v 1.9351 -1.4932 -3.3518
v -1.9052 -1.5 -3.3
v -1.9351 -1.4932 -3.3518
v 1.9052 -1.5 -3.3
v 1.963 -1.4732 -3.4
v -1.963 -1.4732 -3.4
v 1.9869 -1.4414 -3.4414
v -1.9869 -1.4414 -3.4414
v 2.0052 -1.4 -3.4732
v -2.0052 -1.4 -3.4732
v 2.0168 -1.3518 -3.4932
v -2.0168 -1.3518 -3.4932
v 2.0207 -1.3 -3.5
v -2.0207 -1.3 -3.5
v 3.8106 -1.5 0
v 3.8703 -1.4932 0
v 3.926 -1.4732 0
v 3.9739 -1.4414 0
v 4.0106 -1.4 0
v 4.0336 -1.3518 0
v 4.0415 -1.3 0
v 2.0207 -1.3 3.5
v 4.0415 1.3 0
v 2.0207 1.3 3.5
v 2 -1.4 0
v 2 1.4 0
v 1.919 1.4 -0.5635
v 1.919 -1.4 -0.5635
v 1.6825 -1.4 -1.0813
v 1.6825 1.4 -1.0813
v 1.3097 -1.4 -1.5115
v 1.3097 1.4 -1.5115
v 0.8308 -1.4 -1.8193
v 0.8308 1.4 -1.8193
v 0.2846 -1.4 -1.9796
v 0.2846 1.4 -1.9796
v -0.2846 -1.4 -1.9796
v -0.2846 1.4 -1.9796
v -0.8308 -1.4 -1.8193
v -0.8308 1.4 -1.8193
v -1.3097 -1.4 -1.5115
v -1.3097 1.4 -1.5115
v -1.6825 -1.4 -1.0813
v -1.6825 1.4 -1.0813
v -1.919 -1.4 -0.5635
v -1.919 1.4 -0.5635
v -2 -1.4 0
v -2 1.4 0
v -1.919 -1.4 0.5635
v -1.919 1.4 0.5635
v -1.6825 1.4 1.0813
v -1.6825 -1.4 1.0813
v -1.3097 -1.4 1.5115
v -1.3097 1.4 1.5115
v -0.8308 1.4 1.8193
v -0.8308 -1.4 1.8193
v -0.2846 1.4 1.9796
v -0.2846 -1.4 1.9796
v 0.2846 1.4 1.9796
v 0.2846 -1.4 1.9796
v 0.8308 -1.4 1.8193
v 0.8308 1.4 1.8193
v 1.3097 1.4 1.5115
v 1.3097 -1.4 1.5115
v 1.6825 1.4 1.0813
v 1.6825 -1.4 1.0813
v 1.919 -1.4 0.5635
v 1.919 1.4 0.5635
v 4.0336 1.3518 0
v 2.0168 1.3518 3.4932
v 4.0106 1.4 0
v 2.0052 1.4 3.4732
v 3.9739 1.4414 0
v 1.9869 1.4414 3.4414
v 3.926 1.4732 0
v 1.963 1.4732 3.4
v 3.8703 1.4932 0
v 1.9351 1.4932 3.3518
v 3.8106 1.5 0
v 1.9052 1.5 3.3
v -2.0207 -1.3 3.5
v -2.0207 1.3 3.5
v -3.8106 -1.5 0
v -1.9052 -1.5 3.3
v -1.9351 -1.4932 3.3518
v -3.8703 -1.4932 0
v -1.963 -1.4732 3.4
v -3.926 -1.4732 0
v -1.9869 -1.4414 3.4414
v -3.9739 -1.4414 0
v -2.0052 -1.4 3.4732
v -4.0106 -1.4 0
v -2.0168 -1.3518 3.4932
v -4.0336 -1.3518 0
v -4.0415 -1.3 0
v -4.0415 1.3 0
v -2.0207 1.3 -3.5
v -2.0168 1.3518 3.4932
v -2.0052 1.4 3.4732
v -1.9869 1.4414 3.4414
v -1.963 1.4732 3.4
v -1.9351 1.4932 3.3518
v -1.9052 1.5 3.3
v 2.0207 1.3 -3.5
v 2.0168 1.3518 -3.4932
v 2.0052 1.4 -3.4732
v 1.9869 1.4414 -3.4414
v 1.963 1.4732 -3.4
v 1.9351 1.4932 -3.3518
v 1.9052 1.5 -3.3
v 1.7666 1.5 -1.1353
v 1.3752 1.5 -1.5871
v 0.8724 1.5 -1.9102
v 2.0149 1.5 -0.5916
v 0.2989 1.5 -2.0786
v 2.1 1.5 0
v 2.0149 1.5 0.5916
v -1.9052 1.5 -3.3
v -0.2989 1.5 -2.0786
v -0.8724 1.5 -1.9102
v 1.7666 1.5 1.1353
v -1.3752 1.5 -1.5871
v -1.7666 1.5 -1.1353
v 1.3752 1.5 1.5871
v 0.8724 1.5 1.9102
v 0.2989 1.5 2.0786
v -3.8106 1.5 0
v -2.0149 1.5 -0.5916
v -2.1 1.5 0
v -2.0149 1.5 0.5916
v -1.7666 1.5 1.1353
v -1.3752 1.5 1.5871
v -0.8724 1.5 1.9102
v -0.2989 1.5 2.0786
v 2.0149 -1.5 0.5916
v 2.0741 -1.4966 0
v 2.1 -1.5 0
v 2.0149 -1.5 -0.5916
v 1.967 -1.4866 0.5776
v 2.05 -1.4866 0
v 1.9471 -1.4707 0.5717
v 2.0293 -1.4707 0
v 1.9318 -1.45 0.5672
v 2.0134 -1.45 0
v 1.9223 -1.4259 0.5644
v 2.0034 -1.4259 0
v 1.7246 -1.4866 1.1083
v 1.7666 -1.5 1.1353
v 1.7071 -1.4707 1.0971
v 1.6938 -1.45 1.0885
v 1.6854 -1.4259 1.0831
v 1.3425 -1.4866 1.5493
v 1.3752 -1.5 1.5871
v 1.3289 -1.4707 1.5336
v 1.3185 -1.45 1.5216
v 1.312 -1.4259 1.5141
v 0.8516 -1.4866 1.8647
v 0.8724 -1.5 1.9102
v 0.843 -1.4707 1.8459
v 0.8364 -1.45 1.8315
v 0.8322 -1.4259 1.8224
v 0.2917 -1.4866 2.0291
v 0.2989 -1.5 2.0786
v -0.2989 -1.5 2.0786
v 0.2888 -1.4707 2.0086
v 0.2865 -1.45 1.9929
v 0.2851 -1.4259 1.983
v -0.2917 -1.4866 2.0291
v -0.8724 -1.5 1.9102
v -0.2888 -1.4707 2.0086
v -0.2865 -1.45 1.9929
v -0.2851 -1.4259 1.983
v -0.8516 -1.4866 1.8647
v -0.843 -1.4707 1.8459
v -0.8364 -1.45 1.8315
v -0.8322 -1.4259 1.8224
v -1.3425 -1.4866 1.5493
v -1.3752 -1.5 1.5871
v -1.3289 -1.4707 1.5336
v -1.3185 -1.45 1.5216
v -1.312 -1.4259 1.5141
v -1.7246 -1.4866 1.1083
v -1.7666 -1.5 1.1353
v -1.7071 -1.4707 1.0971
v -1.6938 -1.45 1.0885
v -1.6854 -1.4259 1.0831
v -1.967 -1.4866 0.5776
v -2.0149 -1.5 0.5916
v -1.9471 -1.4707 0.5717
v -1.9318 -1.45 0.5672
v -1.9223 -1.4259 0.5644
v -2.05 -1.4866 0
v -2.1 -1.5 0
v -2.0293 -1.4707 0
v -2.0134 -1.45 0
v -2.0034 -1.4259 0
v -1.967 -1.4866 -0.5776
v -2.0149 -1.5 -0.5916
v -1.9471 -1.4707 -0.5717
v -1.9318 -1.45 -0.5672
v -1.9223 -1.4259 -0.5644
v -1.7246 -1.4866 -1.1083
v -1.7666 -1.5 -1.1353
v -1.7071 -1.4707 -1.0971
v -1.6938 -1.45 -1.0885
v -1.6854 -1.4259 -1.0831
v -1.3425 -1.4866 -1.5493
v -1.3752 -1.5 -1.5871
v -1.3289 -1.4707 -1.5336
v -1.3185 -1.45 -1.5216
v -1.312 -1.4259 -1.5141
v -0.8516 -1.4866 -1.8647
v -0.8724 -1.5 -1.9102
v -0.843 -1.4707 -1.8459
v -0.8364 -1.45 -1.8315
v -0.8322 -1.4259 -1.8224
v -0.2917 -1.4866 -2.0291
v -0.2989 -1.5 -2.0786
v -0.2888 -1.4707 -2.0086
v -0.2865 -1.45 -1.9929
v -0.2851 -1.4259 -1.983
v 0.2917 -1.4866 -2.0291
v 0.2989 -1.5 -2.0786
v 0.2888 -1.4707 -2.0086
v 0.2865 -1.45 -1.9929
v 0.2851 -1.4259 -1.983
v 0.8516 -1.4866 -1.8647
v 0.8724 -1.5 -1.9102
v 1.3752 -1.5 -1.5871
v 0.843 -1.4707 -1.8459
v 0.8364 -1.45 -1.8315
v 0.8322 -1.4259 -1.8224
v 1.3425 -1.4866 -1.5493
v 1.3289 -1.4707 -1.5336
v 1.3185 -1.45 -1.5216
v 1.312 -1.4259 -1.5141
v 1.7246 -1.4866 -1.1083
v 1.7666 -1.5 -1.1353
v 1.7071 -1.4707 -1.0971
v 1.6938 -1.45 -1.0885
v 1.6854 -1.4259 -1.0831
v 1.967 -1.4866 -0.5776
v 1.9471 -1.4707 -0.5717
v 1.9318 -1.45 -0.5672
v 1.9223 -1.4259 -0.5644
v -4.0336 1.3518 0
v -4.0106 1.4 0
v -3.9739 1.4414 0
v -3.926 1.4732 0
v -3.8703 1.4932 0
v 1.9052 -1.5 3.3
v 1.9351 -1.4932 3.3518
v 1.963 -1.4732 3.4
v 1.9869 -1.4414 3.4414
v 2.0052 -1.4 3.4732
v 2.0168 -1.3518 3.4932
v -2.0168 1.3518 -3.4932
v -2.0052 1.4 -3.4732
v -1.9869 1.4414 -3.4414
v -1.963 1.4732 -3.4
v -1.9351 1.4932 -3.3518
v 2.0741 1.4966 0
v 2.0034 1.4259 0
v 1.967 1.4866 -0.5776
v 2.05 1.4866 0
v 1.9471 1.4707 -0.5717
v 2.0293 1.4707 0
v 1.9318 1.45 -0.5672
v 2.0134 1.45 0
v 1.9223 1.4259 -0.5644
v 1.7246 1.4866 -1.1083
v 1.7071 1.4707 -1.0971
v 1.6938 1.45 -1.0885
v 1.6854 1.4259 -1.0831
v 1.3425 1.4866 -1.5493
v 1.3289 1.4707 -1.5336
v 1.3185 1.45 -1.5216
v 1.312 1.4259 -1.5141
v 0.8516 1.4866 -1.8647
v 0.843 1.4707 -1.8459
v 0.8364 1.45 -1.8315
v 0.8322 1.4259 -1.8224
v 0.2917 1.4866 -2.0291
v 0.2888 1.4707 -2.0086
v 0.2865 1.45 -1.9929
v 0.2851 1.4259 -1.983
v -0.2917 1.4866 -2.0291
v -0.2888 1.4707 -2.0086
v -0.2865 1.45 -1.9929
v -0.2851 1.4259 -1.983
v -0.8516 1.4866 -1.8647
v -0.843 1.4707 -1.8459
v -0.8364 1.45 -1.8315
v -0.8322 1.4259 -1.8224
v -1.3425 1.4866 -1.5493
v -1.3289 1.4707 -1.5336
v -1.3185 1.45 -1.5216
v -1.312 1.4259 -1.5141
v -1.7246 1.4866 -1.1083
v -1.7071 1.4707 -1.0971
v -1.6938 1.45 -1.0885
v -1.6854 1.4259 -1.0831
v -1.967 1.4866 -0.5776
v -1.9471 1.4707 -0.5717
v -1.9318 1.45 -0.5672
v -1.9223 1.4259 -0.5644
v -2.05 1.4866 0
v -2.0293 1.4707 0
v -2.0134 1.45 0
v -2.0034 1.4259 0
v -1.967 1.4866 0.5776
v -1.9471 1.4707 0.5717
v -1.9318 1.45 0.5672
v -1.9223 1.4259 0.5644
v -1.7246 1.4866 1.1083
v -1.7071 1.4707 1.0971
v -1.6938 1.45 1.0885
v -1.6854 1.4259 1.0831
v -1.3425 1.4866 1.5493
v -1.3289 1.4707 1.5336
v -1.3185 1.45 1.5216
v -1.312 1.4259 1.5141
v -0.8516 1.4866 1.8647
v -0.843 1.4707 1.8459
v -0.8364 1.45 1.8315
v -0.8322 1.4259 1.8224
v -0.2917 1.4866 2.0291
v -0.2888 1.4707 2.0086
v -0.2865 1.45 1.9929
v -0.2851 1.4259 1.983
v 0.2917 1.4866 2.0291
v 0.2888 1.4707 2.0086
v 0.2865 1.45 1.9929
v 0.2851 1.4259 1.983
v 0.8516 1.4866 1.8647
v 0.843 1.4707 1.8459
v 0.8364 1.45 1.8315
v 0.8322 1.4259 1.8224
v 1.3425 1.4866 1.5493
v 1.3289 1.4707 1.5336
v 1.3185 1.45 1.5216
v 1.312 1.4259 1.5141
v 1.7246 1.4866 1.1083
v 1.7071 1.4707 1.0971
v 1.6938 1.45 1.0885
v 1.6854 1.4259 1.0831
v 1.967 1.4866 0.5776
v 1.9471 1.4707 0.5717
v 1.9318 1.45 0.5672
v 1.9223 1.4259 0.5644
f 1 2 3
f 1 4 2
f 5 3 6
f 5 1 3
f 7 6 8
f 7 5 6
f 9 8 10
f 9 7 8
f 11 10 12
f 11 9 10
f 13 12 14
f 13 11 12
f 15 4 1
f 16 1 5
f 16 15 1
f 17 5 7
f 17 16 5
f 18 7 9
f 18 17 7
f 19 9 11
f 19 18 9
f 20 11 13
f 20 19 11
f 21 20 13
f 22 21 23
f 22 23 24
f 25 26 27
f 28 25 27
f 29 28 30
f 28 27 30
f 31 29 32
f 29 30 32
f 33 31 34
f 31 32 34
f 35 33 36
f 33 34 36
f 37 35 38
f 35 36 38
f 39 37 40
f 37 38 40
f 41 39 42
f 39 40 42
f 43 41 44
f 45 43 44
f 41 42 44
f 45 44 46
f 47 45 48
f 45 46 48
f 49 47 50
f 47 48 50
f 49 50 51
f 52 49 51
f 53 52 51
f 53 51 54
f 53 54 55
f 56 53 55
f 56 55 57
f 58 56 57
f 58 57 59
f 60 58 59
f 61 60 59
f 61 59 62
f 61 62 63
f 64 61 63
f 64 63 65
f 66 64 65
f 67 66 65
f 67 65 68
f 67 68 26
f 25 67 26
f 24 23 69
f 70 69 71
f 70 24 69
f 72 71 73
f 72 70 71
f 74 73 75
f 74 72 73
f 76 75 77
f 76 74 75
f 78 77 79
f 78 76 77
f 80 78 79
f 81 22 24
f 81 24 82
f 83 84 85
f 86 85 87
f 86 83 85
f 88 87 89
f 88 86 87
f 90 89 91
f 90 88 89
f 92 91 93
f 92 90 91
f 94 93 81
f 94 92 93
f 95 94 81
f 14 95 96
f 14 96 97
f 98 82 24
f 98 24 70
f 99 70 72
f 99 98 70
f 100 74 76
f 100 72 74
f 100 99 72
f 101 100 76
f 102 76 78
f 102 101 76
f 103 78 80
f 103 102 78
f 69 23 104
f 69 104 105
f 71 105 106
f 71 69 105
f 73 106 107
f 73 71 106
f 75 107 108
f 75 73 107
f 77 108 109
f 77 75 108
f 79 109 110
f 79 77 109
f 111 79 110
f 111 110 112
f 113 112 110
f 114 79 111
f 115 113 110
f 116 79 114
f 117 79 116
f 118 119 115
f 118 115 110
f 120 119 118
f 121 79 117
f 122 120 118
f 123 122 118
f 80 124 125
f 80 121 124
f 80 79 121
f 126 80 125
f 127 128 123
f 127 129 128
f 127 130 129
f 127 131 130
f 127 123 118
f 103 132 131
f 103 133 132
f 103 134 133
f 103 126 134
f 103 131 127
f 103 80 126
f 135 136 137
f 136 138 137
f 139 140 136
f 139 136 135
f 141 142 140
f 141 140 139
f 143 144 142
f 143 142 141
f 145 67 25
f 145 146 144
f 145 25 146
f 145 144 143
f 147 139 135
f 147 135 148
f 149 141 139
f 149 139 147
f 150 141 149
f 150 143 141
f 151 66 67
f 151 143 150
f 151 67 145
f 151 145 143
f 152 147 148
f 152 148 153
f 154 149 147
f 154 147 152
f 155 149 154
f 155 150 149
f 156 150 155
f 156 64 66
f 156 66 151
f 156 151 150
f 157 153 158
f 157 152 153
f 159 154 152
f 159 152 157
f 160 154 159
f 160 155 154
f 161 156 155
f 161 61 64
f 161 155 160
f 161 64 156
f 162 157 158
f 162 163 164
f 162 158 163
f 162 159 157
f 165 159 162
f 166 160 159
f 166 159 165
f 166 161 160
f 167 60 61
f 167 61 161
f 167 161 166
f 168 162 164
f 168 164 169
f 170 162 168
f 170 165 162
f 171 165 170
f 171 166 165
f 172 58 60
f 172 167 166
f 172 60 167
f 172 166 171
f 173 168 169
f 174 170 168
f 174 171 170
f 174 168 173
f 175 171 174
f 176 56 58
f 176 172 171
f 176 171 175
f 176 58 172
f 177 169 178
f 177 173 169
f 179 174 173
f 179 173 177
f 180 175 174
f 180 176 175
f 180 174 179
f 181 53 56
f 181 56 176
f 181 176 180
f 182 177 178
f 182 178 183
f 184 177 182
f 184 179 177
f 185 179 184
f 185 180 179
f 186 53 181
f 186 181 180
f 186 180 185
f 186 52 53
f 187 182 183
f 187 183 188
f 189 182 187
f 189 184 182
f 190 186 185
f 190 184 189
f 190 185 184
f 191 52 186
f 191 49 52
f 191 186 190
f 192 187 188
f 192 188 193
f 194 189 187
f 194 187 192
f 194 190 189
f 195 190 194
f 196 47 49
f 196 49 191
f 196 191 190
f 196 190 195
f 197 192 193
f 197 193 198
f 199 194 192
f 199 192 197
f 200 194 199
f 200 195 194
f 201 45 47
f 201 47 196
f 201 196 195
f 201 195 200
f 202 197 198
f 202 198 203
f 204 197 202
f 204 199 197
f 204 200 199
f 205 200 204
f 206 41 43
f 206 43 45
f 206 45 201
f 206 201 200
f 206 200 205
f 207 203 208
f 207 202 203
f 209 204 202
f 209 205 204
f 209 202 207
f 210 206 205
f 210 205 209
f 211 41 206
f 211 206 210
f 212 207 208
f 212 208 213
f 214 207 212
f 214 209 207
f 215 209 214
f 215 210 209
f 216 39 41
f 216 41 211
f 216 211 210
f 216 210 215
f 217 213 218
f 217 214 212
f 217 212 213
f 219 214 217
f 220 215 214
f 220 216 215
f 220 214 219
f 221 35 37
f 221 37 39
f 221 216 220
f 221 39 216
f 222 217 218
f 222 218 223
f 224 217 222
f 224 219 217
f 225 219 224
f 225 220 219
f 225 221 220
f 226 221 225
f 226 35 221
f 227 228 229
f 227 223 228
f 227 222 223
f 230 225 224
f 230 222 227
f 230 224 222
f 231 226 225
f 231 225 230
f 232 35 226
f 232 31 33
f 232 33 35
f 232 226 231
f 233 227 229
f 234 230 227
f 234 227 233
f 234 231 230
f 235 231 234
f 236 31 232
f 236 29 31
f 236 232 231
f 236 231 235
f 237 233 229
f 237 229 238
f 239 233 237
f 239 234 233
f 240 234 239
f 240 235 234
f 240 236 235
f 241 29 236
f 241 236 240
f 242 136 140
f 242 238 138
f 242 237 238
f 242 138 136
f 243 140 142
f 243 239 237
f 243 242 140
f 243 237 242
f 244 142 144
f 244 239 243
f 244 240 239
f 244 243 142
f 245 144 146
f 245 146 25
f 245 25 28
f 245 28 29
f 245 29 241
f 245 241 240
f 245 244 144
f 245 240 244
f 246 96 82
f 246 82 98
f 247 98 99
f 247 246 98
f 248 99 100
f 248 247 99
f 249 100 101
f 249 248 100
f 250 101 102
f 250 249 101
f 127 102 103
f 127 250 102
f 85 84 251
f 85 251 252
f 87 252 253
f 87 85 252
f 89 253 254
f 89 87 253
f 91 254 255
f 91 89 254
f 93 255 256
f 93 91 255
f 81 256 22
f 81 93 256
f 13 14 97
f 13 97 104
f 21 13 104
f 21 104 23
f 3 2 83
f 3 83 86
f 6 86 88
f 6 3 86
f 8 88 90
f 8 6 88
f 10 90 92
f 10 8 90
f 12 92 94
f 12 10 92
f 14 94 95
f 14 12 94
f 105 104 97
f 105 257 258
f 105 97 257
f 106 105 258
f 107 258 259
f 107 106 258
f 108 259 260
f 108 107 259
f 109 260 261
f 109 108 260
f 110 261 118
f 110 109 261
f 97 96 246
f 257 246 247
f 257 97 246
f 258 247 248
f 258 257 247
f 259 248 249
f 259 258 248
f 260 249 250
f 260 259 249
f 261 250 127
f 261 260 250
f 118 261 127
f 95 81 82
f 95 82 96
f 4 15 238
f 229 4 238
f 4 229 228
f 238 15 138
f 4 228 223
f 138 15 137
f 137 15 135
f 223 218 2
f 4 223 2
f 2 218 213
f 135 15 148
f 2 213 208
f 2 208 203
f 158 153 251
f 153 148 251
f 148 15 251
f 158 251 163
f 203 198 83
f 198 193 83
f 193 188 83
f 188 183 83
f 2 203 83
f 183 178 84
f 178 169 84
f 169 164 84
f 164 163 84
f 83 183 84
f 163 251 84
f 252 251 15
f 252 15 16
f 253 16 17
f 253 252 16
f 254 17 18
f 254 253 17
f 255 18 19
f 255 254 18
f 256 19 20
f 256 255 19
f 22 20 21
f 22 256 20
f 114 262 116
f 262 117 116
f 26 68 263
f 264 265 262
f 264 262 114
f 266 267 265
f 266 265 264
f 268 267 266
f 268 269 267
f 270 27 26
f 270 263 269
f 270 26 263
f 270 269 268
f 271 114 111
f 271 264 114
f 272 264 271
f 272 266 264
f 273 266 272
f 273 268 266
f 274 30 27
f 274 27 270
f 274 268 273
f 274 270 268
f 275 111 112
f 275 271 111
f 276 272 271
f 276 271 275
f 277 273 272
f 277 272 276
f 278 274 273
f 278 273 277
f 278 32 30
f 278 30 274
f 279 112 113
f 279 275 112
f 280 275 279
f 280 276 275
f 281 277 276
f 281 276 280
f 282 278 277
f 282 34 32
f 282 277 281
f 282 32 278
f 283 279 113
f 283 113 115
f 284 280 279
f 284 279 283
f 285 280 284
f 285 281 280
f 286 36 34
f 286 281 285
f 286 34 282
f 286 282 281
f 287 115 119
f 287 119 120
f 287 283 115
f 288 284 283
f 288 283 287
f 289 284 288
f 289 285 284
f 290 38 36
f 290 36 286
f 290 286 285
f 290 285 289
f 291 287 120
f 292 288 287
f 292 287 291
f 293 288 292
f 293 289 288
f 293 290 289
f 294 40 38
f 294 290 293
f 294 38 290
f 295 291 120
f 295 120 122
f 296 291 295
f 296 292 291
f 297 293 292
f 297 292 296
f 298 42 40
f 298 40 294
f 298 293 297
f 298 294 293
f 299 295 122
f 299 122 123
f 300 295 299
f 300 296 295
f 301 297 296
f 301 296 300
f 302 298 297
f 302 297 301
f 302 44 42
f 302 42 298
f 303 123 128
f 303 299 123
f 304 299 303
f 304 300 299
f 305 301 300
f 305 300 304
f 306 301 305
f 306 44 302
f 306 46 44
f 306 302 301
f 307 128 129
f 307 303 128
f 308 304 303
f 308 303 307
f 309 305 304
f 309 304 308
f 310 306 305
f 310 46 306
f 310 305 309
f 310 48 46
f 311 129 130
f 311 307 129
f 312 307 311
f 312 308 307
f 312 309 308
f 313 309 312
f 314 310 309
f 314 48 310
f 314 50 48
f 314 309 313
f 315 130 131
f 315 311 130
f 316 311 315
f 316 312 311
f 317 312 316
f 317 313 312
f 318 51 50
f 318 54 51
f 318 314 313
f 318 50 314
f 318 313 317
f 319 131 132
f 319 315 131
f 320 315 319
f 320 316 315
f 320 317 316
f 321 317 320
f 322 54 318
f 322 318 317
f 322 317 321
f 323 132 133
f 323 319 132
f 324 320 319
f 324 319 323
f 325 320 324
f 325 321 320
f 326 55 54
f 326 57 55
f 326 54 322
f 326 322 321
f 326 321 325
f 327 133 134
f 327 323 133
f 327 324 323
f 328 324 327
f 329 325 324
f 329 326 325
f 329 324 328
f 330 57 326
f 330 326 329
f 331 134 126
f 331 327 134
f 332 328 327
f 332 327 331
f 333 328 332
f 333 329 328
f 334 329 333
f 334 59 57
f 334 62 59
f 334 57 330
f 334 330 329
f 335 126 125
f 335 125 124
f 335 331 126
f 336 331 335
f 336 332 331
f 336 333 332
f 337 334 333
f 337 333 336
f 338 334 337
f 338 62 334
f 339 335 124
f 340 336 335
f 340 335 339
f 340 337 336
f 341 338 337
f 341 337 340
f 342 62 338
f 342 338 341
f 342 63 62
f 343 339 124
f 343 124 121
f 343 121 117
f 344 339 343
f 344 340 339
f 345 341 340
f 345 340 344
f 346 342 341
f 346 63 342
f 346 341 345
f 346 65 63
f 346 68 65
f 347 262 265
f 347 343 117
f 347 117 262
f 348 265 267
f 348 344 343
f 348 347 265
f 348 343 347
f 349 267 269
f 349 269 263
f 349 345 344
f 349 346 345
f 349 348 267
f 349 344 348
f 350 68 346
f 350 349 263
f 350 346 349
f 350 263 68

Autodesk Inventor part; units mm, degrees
ref_plane "YZ Plane" through (0, 0, 0) normal (1, 0, 0) x (0, 1, 0)
ref_plane "XZ Plane" through (0, 0, 0) normal (0, 1, 0) x (-1, 0, 0)
ref_plane "XY Plane" through (0, 0, 0) normal (0, 0, 1) x (1, 0, 0)
sketch "Sketch1" plane through (0, 0, 0) normal (0, 1, 0) x (-1, 0, 0)
  circle A0 centre (0, 0) radius 3.5 construction
  line L0 (-2.0207, -3.5) -> (-4.0415, 0)
  line L1 (-4.0415, 0) -> (-2.0207, 3.5)
  line L2 (-2.0207, 3.5) -> (2.0207, 3.5)
  line L3 (2.0207, 3.5) -> (4.0415, 0)
  line L4 (4.0415, 0) -> (2.0207, -3.5)
  line L5 (2.0207, -3.5) -> (-2.0207, -3.5)
  point P0 (0, -3.5)
  dimension "d0" = 7
extrude "Extrusion1" add sketch "Sketch1" along normal mid plane 3
sketch "Sketch2" plane through (0, 1.5, 0) normal (0, 1, 0) x (1, 0, 0)
  circle A0 centre (0, 0) radius 2
  dimension "d3" = 4
extrude "Extrusion2" cut sketch "Sketch2" against normal blind 3
fillet "Fillet1" radius 0.2 12 edges at (-3.0311, 1.5, 1.75) (0, 1.5, 3.5) (3.0311, 1.5, 1.75) (3.0311, 1.5, -1.75) (0, 1.5, -3.5) (-3.0311, 1.5, -1.75) (0, -1.5, 3.5) (-3.0311, -1.5, 1.75) (-3.0311, -1.5, -1.75) (0, -1.5, -3.5) (3.0311, -1.5, -1.75) (3.0311, -1.5, 1.75)
fillet "Fillet2" radius 0.1 2 edges at (-2, 1.5, 0) (-2, -1.5, 0)
thread "Thread1" size "M4x0.7" class "6H" standard "ANSI Metric M Profile" full length
properties part number "M4 Nut" material "Stainless Steel"
